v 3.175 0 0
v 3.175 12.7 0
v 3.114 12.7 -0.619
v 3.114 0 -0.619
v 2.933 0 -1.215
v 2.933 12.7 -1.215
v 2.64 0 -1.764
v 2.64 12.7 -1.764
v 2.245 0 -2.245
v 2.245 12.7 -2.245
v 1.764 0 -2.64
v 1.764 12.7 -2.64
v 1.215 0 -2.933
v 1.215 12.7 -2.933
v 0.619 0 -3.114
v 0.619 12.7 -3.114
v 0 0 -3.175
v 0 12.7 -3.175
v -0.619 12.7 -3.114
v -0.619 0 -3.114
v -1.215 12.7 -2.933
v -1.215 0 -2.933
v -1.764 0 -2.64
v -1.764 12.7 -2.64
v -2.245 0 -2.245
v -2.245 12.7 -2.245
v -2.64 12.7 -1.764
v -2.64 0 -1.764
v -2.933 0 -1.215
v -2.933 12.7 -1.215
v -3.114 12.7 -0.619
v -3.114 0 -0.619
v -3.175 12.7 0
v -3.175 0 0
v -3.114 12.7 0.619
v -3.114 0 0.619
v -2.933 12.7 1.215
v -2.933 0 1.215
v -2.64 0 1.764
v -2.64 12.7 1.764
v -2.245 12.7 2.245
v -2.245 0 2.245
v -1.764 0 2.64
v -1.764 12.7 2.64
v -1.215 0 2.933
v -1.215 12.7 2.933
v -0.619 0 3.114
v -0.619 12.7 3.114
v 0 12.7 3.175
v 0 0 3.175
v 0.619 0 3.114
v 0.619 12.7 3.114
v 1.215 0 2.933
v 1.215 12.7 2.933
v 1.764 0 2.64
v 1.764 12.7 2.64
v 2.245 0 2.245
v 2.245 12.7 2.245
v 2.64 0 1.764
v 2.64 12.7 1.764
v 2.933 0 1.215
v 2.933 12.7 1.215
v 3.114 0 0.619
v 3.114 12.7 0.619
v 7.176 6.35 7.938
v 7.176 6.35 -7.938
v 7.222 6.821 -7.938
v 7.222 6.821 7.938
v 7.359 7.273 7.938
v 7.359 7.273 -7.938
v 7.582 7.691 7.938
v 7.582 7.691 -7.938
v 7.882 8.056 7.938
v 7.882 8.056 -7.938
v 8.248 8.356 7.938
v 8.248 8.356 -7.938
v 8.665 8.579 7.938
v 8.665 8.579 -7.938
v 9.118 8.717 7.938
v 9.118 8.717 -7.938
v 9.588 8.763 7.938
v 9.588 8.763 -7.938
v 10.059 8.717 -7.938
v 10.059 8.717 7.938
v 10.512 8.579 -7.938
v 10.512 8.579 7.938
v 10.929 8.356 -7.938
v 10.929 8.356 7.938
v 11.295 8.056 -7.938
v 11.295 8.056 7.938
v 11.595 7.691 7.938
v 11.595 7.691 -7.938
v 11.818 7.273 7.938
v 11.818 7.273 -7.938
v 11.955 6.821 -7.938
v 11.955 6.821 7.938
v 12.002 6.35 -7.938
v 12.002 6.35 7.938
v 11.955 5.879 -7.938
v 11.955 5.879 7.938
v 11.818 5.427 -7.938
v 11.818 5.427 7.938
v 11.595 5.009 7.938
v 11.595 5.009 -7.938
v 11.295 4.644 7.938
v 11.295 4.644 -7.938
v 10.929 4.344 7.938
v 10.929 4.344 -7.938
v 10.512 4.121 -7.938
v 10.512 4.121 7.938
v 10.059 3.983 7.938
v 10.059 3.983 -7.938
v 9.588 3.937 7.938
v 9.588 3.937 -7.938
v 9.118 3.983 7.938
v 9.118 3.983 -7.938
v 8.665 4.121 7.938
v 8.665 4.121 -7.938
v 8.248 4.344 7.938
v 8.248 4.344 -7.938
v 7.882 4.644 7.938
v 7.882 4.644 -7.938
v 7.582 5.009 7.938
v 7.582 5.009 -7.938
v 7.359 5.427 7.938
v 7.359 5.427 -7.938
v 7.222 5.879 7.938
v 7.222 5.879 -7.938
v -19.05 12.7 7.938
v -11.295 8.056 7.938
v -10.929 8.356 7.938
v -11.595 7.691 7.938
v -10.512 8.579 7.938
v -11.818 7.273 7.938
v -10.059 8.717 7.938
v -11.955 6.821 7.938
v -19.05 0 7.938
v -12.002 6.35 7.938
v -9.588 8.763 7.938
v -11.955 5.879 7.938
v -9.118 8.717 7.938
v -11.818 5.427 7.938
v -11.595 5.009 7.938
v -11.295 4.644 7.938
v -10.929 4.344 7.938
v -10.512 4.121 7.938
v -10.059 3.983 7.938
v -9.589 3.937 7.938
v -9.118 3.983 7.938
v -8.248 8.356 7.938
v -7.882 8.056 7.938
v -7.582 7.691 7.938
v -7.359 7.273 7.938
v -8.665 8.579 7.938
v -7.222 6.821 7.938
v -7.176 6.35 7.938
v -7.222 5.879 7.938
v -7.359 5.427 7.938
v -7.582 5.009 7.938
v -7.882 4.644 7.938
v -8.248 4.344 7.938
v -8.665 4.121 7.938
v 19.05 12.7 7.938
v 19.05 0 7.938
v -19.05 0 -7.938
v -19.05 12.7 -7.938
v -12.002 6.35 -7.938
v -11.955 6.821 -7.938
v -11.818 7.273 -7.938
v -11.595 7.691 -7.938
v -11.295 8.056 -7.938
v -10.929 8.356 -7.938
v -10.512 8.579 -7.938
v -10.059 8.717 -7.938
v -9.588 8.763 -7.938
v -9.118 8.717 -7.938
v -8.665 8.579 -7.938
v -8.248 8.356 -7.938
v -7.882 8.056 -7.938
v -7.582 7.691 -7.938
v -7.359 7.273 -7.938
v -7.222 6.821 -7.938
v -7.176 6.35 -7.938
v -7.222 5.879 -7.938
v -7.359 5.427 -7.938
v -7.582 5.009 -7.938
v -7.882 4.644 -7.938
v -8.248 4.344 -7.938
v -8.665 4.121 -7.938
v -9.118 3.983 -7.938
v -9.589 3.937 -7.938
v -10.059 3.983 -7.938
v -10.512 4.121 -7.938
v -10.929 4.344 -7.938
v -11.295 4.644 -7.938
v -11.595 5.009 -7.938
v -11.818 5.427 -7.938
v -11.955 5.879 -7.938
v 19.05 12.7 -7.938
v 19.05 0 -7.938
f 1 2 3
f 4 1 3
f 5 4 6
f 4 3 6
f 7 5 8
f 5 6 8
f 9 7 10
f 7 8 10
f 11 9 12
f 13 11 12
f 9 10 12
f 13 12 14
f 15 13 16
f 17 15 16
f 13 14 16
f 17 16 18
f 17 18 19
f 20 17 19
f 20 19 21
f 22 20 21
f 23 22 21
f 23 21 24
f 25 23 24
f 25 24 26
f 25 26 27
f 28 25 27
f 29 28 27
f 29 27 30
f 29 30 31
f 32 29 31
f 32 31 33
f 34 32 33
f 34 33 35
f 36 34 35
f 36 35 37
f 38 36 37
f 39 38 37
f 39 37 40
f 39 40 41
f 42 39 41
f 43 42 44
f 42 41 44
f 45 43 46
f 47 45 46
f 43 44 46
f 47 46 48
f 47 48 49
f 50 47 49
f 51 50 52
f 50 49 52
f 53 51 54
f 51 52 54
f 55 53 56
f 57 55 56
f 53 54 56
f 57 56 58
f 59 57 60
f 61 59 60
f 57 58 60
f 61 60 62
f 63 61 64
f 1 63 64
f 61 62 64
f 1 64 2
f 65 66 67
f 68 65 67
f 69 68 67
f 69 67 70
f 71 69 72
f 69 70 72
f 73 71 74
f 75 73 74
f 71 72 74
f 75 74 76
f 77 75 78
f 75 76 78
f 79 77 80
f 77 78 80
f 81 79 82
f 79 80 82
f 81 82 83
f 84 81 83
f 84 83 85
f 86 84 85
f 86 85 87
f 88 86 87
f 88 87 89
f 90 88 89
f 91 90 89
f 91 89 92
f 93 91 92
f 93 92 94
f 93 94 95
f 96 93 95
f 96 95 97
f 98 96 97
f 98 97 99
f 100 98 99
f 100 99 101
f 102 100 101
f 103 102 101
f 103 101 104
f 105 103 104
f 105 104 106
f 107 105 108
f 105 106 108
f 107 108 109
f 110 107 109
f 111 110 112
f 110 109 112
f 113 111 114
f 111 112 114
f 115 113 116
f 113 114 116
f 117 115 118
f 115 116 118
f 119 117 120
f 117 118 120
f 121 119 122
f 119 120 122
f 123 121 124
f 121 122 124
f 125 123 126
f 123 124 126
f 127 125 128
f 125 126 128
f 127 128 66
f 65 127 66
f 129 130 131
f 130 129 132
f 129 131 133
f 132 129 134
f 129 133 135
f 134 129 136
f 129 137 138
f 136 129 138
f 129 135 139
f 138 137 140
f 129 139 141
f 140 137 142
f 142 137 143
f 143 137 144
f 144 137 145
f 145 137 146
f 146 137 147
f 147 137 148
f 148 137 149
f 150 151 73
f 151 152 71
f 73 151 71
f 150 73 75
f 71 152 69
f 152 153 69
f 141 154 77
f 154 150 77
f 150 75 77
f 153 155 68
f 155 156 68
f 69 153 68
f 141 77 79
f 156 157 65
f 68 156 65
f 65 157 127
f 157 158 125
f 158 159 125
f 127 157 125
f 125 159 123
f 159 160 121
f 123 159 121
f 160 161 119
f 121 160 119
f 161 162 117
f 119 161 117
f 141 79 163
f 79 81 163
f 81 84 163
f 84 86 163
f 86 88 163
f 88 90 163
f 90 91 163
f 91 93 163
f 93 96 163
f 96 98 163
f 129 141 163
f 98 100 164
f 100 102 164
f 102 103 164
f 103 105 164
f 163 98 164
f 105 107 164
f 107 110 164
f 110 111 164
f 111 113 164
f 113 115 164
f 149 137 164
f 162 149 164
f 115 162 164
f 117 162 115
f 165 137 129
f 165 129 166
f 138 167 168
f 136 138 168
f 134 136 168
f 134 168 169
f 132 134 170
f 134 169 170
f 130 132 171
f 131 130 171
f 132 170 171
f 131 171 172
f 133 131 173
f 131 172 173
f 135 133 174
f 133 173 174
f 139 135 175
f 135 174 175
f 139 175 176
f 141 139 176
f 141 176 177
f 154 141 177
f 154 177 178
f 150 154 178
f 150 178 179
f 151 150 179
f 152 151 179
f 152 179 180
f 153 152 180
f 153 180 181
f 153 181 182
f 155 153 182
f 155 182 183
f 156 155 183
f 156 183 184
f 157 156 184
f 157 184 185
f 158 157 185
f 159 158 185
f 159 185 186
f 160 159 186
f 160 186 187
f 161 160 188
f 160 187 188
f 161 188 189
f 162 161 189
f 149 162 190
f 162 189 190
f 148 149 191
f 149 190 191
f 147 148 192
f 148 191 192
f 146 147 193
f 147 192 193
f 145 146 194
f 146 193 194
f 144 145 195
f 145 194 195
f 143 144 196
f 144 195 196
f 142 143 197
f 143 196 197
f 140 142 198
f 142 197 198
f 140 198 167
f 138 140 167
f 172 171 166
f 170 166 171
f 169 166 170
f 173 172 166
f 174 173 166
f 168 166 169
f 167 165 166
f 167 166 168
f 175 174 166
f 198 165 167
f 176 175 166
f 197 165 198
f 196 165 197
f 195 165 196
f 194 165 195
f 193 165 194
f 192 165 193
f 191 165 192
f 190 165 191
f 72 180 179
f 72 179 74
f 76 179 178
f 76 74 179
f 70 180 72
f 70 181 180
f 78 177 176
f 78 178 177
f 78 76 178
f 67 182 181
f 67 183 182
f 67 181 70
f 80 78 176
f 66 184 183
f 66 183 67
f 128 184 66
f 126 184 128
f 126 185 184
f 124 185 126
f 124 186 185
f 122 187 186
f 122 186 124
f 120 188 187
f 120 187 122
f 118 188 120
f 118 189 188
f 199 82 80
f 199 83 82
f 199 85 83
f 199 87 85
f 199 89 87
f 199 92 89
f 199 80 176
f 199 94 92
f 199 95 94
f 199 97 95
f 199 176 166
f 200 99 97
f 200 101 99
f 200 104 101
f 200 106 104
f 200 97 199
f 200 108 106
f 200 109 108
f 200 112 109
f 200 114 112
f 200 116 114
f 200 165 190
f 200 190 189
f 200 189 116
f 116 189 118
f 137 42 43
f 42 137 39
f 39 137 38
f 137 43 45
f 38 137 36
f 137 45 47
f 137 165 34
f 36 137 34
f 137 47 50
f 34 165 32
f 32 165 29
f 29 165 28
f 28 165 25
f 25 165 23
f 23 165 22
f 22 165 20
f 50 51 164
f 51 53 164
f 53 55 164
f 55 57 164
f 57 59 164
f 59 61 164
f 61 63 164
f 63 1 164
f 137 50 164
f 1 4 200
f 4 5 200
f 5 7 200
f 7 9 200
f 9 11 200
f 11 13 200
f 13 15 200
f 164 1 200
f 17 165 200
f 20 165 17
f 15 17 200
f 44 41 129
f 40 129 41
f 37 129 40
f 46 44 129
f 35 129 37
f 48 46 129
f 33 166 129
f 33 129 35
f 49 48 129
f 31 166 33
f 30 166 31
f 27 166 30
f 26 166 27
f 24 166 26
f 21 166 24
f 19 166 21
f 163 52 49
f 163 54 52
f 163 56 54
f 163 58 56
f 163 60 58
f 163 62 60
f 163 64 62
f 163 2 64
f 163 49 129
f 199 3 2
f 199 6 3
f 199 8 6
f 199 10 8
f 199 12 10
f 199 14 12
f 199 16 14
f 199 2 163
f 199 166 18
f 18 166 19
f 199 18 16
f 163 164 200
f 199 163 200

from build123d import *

# Parameters (mm, degrees)
SKETCH1_W           = 38.1
SKETCH1_H           = 15.875
BOSS_EXTRUDE1_DEPTH = 12.7
SKETCH2_R           = 2.413
CUT_EXTRUDE1_DEPTH  = 16.875
SKETCH3_R           = 3.175
CUT_EXTRUDE2_DEPTH  = 13.7


with BuildPart() as part:
    # Sketch1 → Boss-Extrude1 (new body)
    with BuildSketch(Plane(origin=(0, 0, 0), x_dir=(1, 0, 0), z_dir=(0, 1, 0))):
        Rectangle(SKETCH1_W, SKETCH1_H)
    extrude(amount=BOSS_EXTRUDE1_DEPTH)

    # Sketch2 → Cut-Extrude1 (cut, through all)
    with BuildSketch(Plane(origin=(0, 0, -7.9375), x_dir=(-1, 0, 0), z_dir=(0, 0, -1))):
        with Locations((-9.5885, 6.35)):
            Circle(SKETCH2_R)
        with Locations((9.5885, 6.35)):
            Circle(SKETCH2_R)
    extrude(amount=-CUT_EXTRUDE1_DEPTH, mode=Mode.SUBTRACT)

    # Sketch3 → Cut-Extrude2 (cut, through all)
    with BuildSketch(Plane(origin=(0, 12.7, 0), x_dir=(1, 0, 0), z_dir=(0, 1, 0))):
        Circle(SKETCH3_R)
    extrude(amount=-CUT_EXTRUDE2_DEPTH, mode=Mode.SUBTRACT)


solid = part.part
